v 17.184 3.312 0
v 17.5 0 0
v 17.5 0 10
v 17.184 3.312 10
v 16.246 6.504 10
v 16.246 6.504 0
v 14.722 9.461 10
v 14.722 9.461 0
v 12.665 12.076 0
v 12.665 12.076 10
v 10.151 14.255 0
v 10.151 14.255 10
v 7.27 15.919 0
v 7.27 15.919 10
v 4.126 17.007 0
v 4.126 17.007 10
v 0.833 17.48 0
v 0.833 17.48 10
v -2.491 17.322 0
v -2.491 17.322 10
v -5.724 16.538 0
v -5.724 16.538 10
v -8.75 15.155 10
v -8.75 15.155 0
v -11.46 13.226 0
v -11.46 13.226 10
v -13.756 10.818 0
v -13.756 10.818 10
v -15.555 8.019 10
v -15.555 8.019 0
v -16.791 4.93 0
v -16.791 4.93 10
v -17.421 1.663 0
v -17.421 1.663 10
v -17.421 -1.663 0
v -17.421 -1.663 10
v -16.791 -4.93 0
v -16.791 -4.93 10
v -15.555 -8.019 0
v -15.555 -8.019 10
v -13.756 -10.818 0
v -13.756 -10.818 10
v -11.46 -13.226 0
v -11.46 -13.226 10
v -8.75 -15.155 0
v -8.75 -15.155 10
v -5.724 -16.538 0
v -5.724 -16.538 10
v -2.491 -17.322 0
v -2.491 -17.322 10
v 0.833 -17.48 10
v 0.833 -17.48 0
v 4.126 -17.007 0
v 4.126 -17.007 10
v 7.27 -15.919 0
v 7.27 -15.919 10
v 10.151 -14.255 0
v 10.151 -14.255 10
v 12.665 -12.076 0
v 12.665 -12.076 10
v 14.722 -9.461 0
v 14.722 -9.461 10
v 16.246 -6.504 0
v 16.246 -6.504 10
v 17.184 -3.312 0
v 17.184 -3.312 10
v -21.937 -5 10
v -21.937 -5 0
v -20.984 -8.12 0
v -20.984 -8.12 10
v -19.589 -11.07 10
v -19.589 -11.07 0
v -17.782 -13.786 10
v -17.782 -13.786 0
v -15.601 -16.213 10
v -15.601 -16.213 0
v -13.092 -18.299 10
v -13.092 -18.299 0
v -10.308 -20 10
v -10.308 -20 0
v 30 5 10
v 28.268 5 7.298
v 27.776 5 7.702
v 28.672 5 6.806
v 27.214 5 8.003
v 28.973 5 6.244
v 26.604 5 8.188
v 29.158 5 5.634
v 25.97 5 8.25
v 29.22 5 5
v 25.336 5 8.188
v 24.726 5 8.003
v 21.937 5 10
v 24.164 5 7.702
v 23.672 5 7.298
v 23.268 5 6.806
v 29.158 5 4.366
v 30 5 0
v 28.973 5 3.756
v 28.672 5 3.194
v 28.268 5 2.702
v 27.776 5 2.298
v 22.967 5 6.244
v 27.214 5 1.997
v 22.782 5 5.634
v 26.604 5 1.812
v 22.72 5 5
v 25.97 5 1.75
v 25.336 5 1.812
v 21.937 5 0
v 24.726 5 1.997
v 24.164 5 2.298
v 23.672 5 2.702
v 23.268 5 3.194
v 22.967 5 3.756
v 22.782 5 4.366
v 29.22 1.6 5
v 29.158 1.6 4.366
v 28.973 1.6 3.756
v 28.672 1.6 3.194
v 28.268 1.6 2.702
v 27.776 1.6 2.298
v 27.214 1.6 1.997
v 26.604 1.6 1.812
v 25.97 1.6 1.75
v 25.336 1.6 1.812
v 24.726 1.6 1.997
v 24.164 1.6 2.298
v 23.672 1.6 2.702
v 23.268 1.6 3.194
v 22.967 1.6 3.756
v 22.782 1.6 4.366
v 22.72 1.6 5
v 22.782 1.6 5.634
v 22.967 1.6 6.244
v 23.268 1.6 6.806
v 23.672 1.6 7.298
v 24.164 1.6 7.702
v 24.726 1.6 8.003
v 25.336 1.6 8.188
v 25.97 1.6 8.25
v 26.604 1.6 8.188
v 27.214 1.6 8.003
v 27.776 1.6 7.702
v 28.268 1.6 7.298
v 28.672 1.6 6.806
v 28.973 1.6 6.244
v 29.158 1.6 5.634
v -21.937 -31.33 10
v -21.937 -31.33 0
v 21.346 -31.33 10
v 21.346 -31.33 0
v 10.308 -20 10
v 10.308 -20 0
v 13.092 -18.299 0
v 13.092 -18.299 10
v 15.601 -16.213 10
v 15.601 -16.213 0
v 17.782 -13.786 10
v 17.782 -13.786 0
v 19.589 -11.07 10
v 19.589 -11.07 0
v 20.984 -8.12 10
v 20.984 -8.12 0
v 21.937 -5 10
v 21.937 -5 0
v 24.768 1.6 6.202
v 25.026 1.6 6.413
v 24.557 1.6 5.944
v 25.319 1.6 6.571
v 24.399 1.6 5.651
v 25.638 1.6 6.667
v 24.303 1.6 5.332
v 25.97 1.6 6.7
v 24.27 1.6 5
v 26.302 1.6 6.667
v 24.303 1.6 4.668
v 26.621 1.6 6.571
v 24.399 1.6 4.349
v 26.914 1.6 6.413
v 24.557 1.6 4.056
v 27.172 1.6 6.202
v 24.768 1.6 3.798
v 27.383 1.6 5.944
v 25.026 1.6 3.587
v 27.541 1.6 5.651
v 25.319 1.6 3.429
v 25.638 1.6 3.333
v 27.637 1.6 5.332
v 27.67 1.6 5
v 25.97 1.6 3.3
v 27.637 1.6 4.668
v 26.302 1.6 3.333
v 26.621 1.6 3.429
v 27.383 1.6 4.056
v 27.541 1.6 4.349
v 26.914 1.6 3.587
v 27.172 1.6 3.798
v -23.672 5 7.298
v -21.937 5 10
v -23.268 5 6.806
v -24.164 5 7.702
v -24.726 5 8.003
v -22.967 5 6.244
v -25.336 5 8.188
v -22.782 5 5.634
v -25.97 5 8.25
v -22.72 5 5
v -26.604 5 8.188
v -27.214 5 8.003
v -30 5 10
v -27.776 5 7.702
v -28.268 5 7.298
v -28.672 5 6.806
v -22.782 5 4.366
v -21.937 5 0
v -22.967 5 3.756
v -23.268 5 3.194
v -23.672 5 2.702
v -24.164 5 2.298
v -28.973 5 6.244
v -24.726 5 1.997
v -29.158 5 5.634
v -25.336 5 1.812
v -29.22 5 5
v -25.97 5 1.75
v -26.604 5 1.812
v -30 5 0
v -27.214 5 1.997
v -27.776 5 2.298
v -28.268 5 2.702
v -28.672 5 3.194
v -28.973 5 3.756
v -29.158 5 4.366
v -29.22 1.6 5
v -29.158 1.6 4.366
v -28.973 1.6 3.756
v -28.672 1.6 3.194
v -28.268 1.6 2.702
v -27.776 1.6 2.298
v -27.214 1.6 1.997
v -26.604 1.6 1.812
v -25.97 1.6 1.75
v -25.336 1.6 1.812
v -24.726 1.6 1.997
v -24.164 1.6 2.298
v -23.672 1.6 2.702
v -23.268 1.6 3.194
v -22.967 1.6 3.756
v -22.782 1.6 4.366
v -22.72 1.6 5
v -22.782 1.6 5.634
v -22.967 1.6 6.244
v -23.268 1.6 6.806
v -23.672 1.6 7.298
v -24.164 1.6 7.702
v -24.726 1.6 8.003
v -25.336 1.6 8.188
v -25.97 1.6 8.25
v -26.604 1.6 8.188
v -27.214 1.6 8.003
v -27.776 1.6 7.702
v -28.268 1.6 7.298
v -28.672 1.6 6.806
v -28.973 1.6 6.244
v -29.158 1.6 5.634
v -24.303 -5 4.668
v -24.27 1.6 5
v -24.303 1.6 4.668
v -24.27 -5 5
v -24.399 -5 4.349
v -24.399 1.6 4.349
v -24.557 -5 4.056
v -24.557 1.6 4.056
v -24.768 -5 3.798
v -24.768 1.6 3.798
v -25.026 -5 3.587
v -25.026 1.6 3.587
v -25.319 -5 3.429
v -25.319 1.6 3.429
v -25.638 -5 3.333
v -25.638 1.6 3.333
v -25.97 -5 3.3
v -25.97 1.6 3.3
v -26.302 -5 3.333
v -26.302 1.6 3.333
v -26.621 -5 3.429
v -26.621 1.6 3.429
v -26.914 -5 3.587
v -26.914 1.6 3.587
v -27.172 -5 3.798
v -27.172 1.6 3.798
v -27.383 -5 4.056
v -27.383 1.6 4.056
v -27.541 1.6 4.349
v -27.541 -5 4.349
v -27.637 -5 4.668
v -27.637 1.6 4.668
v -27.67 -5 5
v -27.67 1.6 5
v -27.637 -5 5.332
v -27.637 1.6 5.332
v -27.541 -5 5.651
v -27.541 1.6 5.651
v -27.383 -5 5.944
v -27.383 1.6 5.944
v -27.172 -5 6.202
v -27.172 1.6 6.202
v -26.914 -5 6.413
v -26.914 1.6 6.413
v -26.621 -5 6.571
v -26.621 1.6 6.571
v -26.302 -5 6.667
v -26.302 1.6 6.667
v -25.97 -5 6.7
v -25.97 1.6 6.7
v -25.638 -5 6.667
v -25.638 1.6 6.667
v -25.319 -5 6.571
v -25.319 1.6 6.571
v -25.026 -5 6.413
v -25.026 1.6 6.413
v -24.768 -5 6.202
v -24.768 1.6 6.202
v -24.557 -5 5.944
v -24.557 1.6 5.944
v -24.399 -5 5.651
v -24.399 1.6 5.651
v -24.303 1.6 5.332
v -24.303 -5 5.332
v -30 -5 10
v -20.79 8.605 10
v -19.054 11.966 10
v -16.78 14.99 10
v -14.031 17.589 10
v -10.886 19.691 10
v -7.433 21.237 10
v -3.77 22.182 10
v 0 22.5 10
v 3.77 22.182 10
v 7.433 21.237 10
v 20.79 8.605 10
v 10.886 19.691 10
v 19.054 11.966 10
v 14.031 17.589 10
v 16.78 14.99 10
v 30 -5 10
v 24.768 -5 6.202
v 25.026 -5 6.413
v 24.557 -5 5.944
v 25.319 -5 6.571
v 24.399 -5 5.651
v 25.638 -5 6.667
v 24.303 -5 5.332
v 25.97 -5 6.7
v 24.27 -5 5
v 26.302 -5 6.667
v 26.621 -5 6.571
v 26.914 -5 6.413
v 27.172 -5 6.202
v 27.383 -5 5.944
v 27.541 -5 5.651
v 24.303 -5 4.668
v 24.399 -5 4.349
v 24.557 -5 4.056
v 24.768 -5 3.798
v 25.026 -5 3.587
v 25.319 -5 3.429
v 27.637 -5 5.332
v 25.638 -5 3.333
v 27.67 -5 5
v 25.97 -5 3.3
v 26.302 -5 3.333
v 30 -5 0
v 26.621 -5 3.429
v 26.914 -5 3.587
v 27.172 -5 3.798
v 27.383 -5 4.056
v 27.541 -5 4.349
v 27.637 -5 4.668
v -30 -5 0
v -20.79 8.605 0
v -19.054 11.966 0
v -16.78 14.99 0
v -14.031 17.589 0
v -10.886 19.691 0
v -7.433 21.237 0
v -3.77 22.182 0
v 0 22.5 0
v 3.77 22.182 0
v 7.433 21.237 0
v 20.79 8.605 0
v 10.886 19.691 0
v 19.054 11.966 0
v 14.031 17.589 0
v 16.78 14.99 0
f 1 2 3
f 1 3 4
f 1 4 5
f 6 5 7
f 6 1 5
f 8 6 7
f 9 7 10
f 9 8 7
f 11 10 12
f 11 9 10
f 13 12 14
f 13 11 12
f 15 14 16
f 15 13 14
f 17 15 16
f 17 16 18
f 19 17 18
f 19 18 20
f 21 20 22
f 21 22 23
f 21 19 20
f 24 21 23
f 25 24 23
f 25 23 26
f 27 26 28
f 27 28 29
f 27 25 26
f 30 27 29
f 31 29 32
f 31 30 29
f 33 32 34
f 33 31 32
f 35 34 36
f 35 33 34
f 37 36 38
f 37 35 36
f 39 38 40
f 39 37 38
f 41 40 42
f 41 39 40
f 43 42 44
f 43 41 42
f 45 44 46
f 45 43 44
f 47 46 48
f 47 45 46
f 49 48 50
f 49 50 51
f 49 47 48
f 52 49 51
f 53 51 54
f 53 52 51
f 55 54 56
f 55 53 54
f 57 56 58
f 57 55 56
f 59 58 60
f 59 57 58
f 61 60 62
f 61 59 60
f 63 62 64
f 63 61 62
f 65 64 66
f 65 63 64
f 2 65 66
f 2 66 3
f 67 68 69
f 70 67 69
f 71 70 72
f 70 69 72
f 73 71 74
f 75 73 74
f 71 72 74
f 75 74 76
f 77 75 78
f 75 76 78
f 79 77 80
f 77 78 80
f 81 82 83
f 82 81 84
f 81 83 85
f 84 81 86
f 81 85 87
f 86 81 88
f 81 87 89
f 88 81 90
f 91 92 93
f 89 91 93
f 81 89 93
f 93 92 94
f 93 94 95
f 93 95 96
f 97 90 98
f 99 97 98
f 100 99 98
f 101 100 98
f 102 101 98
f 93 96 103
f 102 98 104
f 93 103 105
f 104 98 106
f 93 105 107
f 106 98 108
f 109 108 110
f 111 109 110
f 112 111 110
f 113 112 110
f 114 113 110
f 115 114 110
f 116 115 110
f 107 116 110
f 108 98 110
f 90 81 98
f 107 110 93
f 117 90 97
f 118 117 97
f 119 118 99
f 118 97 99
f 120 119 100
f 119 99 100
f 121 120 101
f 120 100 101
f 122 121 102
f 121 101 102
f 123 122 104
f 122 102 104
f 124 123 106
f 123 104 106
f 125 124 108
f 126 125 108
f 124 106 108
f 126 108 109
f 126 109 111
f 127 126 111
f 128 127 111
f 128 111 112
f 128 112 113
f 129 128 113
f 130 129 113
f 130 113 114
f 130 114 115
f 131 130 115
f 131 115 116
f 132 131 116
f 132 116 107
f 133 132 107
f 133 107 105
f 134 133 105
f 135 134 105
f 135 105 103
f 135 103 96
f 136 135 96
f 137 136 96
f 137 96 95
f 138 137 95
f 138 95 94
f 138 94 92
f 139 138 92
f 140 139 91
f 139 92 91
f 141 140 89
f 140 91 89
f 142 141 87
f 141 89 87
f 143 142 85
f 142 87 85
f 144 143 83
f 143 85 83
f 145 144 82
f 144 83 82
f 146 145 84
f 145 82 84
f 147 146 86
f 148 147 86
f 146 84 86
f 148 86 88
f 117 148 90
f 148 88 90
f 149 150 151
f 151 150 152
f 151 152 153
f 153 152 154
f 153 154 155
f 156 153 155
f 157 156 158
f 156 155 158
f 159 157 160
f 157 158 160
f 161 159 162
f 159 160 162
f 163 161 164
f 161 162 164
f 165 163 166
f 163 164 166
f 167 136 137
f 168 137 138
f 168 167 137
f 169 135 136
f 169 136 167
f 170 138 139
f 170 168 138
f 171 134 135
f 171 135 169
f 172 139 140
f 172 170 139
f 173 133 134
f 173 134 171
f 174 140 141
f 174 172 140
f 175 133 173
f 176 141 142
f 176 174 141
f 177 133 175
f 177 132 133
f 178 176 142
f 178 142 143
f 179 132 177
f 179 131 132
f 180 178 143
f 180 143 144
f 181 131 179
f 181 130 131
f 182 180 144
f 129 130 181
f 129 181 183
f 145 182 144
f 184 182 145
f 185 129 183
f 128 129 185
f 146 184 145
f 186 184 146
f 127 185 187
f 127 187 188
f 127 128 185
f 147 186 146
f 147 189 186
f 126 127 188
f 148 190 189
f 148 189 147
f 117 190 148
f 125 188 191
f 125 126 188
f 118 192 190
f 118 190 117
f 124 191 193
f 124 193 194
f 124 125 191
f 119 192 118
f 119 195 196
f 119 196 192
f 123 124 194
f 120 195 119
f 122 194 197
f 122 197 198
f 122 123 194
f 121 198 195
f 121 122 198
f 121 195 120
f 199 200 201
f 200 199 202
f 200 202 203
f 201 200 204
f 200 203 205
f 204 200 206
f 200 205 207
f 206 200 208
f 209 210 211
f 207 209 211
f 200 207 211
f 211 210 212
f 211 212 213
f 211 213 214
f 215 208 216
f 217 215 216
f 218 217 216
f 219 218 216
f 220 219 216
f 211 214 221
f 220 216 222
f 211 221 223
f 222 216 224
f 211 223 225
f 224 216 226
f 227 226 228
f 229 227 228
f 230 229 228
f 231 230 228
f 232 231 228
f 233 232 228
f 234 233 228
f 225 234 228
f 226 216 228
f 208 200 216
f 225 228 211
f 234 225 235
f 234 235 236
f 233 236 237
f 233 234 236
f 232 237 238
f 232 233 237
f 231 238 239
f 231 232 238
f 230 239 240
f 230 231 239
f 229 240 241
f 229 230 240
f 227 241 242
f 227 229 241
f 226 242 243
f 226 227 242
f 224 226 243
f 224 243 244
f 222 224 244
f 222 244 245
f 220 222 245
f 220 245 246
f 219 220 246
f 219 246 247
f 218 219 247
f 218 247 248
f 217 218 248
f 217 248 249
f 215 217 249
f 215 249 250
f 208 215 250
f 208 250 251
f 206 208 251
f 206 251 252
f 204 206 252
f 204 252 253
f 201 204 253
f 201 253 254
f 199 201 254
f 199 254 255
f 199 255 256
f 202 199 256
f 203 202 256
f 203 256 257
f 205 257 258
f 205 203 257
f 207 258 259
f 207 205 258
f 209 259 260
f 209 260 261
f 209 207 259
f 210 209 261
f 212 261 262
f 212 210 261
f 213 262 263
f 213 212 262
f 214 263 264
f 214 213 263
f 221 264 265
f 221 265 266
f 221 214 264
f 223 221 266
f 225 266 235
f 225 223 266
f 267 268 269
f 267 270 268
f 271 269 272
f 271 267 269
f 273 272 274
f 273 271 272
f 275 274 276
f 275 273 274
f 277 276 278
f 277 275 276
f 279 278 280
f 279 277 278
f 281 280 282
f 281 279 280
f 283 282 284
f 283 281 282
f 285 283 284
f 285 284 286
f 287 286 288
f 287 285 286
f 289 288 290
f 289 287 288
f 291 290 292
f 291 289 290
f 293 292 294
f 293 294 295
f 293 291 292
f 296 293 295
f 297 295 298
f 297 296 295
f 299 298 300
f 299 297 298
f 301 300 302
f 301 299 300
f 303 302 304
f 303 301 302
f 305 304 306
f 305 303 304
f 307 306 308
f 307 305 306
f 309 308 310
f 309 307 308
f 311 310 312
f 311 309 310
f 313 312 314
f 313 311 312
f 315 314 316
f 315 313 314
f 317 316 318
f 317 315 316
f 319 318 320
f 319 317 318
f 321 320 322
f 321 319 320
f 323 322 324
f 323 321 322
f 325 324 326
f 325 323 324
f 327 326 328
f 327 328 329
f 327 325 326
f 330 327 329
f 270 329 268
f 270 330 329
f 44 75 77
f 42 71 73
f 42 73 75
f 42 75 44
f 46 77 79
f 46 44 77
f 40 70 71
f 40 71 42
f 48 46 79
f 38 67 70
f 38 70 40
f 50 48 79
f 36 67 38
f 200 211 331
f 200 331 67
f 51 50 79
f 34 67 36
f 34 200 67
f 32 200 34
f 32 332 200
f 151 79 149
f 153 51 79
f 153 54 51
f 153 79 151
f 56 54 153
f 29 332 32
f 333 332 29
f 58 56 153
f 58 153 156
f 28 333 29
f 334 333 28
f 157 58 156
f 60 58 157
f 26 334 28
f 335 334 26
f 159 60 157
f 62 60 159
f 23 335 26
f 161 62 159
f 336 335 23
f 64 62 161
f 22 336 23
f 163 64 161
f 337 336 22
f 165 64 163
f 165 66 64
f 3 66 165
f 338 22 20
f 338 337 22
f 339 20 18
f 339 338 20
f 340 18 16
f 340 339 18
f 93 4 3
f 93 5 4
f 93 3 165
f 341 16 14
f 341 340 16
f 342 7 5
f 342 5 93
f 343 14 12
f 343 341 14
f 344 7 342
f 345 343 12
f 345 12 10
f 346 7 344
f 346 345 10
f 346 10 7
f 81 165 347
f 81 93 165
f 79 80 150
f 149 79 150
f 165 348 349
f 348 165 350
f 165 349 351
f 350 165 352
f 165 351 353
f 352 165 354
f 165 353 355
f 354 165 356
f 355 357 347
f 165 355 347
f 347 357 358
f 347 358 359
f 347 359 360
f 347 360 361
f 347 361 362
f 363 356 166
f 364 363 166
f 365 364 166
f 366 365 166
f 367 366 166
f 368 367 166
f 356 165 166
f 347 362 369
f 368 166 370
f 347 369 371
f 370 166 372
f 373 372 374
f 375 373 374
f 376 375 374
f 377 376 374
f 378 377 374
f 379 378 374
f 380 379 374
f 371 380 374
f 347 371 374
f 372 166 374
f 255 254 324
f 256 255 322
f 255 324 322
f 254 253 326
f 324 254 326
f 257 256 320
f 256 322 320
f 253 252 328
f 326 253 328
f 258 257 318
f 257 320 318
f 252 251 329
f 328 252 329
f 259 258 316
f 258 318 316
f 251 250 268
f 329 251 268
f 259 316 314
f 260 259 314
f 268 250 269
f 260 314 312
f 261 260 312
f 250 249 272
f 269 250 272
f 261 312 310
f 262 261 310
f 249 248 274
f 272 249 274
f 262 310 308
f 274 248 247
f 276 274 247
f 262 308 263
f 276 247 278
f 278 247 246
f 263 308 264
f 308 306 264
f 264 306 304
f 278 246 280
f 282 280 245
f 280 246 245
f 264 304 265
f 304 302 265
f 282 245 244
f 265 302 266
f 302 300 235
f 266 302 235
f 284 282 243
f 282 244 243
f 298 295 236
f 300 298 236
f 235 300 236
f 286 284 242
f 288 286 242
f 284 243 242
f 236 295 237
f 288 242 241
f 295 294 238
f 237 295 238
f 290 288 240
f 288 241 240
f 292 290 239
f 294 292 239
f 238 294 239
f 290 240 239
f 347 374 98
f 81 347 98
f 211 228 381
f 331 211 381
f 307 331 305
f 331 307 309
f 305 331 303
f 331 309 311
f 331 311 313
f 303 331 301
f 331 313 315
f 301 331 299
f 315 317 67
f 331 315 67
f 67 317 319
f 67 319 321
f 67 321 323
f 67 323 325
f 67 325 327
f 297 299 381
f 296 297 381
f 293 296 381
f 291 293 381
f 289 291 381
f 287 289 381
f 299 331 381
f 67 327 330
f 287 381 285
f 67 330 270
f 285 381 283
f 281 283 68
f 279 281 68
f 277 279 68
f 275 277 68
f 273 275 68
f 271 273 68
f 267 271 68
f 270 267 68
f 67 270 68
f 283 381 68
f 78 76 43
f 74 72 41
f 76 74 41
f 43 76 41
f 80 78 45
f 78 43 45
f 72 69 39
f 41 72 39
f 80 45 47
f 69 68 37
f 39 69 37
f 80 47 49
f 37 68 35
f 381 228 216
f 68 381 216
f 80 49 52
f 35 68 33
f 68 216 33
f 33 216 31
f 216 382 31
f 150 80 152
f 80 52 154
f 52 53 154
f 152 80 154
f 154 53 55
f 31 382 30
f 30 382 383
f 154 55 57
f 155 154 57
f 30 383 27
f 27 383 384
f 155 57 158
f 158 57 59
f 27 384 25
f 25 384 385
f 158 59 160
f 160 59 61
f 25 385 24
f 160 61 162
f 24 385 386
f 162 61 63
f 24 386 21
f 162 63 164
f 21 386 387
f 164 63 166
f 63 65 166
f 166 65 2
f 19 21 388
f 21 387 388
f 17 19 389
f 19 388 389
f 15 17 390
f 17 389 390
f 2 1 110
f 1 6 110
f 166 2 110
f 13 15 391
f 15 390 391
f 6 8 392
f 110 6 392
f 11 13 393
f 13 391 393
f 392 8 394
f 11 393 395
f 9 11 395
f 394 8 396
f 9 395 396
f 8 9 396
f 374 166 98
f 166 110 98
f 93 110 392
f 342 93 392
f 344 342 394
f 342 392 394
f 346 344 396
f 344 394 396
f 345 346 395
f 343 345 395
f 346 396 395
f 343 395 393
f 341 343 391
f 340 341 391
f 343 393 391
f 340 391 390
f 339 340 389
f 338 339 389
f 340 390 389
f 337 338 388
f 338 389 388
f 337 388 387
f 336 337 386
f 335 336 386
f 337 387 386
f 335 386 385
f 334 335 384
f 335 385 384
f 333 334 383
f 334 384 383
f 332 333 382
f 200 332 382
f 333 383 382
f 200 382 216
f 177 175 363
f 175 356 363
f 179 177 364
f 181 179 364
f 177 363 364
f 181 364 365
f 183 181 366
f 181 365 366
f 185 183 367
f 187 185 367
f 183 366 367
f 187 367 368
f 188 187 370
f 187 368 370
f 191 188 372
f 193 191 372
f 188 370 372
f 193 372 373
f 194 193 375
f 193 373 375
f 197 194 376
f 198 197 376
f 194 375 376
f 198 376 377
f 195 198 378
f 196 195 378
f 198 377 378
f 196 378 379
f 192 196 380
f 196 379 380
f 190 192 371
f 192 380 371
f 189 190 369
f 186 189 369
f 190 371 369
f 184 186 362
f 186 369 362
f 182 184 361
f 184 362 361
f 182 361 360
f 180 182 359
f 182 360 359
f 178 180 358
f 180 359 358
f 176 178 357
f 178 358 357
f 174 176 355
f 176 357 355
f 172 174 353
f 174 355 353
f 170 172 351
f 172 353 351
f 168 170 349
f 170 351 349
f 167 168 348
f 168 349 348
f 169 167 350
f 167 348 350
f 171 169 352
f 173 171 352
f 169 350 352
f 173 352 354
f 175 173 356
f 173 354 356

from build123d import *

# Parameters (mm, degrees)
ESQUISSE1_R                                        = 17.5
BOSS_EXTRU_1_DEPTH                                 = 10
CHAMBRAGE_POUR_VIS_T_TE_HEXAGONALE_M31_D           = 3.4
CHAMBRAGE_POUR_VIS_T_TE_HEXAGONALE_M31_CBORE_D     = 6.5
CHAMBRAGE_POUR_VIS_T_TE_HEXAGONALE_M31_CBORE_DEPTH = 3.4


with BuildPart() as part:
    # Esquisse1 → Boss.-Extru.1 (new body)
    with BuildSketch(Plane.XY):
        with BuildLine():
            Line((30, -5), (30, 5))
            Line((30, 5), (21.937410968, 5))
            ThreePointArc((21.937410968, 5), (0, 22.5), (-21.937410968, 5))
            Line((-21.937410968, 5), (-30, 5))
            Line((-30, 5), (-30, -5))
            Line((-30, -5), (-21.937410968, -5))
            ThreePointArc((-21.937410968, -5), (-17.781671131, -13.786303775), (-10.307764064, -20))
            Line((-10.307764064, -20), (-21.937410968, -31.33))
            Line((-21.937410968, -31.33), (21.345837795, -31.33))
            Line((21.345837795, -31.33), (10.307764064, -20))
            ThreePointArc((10.307764064, -20), (17.781671131, -13.786303775), (21.937410968, -5))
            Line((21.937410968, -5), (30, -5))
        make_face()
        Circle(ESQUISSE1_R, mode=Mode.SUBTRACT)
    extrude(amount=BOSS_EXTRU_1_DEPTH)

    # Chambrage pour vis à tête hexagonale M31 (through all)
    with Locations(Plane(origin=(25.97, 5, 5), x_dir=(1, 0, 0), z_dir=(0, 1, 0))):
        with Locations((0, 0)):
            chambrage_pour_vis_t_te_hexagonale_m31 = CounterBoreHole(CHAMBRAGE_POUR_VIS_T_TE_HEXAGONALE_M31_D / 2, CHAMBRAGE_POUR_VIS_T_TE_HEXAGONALE_M31_CBORE_D / 2, CHAMBRAGE_POUR_VIS_T_TE_HEXAGONALE_M31_CBORE_DEPTH)

    # Symétrie2: Chambrage pour vis à tête hexagonale M31 across plane
    add(chambrage_pour_vis_t_te_hexagonale_m31.mirror(Plane(origin=(0, 0, 0), x_dir=(0, 0, 1), z_dir=(1, 0, 0))), mode=Mode.SUBTRACT)


solid = part.part
